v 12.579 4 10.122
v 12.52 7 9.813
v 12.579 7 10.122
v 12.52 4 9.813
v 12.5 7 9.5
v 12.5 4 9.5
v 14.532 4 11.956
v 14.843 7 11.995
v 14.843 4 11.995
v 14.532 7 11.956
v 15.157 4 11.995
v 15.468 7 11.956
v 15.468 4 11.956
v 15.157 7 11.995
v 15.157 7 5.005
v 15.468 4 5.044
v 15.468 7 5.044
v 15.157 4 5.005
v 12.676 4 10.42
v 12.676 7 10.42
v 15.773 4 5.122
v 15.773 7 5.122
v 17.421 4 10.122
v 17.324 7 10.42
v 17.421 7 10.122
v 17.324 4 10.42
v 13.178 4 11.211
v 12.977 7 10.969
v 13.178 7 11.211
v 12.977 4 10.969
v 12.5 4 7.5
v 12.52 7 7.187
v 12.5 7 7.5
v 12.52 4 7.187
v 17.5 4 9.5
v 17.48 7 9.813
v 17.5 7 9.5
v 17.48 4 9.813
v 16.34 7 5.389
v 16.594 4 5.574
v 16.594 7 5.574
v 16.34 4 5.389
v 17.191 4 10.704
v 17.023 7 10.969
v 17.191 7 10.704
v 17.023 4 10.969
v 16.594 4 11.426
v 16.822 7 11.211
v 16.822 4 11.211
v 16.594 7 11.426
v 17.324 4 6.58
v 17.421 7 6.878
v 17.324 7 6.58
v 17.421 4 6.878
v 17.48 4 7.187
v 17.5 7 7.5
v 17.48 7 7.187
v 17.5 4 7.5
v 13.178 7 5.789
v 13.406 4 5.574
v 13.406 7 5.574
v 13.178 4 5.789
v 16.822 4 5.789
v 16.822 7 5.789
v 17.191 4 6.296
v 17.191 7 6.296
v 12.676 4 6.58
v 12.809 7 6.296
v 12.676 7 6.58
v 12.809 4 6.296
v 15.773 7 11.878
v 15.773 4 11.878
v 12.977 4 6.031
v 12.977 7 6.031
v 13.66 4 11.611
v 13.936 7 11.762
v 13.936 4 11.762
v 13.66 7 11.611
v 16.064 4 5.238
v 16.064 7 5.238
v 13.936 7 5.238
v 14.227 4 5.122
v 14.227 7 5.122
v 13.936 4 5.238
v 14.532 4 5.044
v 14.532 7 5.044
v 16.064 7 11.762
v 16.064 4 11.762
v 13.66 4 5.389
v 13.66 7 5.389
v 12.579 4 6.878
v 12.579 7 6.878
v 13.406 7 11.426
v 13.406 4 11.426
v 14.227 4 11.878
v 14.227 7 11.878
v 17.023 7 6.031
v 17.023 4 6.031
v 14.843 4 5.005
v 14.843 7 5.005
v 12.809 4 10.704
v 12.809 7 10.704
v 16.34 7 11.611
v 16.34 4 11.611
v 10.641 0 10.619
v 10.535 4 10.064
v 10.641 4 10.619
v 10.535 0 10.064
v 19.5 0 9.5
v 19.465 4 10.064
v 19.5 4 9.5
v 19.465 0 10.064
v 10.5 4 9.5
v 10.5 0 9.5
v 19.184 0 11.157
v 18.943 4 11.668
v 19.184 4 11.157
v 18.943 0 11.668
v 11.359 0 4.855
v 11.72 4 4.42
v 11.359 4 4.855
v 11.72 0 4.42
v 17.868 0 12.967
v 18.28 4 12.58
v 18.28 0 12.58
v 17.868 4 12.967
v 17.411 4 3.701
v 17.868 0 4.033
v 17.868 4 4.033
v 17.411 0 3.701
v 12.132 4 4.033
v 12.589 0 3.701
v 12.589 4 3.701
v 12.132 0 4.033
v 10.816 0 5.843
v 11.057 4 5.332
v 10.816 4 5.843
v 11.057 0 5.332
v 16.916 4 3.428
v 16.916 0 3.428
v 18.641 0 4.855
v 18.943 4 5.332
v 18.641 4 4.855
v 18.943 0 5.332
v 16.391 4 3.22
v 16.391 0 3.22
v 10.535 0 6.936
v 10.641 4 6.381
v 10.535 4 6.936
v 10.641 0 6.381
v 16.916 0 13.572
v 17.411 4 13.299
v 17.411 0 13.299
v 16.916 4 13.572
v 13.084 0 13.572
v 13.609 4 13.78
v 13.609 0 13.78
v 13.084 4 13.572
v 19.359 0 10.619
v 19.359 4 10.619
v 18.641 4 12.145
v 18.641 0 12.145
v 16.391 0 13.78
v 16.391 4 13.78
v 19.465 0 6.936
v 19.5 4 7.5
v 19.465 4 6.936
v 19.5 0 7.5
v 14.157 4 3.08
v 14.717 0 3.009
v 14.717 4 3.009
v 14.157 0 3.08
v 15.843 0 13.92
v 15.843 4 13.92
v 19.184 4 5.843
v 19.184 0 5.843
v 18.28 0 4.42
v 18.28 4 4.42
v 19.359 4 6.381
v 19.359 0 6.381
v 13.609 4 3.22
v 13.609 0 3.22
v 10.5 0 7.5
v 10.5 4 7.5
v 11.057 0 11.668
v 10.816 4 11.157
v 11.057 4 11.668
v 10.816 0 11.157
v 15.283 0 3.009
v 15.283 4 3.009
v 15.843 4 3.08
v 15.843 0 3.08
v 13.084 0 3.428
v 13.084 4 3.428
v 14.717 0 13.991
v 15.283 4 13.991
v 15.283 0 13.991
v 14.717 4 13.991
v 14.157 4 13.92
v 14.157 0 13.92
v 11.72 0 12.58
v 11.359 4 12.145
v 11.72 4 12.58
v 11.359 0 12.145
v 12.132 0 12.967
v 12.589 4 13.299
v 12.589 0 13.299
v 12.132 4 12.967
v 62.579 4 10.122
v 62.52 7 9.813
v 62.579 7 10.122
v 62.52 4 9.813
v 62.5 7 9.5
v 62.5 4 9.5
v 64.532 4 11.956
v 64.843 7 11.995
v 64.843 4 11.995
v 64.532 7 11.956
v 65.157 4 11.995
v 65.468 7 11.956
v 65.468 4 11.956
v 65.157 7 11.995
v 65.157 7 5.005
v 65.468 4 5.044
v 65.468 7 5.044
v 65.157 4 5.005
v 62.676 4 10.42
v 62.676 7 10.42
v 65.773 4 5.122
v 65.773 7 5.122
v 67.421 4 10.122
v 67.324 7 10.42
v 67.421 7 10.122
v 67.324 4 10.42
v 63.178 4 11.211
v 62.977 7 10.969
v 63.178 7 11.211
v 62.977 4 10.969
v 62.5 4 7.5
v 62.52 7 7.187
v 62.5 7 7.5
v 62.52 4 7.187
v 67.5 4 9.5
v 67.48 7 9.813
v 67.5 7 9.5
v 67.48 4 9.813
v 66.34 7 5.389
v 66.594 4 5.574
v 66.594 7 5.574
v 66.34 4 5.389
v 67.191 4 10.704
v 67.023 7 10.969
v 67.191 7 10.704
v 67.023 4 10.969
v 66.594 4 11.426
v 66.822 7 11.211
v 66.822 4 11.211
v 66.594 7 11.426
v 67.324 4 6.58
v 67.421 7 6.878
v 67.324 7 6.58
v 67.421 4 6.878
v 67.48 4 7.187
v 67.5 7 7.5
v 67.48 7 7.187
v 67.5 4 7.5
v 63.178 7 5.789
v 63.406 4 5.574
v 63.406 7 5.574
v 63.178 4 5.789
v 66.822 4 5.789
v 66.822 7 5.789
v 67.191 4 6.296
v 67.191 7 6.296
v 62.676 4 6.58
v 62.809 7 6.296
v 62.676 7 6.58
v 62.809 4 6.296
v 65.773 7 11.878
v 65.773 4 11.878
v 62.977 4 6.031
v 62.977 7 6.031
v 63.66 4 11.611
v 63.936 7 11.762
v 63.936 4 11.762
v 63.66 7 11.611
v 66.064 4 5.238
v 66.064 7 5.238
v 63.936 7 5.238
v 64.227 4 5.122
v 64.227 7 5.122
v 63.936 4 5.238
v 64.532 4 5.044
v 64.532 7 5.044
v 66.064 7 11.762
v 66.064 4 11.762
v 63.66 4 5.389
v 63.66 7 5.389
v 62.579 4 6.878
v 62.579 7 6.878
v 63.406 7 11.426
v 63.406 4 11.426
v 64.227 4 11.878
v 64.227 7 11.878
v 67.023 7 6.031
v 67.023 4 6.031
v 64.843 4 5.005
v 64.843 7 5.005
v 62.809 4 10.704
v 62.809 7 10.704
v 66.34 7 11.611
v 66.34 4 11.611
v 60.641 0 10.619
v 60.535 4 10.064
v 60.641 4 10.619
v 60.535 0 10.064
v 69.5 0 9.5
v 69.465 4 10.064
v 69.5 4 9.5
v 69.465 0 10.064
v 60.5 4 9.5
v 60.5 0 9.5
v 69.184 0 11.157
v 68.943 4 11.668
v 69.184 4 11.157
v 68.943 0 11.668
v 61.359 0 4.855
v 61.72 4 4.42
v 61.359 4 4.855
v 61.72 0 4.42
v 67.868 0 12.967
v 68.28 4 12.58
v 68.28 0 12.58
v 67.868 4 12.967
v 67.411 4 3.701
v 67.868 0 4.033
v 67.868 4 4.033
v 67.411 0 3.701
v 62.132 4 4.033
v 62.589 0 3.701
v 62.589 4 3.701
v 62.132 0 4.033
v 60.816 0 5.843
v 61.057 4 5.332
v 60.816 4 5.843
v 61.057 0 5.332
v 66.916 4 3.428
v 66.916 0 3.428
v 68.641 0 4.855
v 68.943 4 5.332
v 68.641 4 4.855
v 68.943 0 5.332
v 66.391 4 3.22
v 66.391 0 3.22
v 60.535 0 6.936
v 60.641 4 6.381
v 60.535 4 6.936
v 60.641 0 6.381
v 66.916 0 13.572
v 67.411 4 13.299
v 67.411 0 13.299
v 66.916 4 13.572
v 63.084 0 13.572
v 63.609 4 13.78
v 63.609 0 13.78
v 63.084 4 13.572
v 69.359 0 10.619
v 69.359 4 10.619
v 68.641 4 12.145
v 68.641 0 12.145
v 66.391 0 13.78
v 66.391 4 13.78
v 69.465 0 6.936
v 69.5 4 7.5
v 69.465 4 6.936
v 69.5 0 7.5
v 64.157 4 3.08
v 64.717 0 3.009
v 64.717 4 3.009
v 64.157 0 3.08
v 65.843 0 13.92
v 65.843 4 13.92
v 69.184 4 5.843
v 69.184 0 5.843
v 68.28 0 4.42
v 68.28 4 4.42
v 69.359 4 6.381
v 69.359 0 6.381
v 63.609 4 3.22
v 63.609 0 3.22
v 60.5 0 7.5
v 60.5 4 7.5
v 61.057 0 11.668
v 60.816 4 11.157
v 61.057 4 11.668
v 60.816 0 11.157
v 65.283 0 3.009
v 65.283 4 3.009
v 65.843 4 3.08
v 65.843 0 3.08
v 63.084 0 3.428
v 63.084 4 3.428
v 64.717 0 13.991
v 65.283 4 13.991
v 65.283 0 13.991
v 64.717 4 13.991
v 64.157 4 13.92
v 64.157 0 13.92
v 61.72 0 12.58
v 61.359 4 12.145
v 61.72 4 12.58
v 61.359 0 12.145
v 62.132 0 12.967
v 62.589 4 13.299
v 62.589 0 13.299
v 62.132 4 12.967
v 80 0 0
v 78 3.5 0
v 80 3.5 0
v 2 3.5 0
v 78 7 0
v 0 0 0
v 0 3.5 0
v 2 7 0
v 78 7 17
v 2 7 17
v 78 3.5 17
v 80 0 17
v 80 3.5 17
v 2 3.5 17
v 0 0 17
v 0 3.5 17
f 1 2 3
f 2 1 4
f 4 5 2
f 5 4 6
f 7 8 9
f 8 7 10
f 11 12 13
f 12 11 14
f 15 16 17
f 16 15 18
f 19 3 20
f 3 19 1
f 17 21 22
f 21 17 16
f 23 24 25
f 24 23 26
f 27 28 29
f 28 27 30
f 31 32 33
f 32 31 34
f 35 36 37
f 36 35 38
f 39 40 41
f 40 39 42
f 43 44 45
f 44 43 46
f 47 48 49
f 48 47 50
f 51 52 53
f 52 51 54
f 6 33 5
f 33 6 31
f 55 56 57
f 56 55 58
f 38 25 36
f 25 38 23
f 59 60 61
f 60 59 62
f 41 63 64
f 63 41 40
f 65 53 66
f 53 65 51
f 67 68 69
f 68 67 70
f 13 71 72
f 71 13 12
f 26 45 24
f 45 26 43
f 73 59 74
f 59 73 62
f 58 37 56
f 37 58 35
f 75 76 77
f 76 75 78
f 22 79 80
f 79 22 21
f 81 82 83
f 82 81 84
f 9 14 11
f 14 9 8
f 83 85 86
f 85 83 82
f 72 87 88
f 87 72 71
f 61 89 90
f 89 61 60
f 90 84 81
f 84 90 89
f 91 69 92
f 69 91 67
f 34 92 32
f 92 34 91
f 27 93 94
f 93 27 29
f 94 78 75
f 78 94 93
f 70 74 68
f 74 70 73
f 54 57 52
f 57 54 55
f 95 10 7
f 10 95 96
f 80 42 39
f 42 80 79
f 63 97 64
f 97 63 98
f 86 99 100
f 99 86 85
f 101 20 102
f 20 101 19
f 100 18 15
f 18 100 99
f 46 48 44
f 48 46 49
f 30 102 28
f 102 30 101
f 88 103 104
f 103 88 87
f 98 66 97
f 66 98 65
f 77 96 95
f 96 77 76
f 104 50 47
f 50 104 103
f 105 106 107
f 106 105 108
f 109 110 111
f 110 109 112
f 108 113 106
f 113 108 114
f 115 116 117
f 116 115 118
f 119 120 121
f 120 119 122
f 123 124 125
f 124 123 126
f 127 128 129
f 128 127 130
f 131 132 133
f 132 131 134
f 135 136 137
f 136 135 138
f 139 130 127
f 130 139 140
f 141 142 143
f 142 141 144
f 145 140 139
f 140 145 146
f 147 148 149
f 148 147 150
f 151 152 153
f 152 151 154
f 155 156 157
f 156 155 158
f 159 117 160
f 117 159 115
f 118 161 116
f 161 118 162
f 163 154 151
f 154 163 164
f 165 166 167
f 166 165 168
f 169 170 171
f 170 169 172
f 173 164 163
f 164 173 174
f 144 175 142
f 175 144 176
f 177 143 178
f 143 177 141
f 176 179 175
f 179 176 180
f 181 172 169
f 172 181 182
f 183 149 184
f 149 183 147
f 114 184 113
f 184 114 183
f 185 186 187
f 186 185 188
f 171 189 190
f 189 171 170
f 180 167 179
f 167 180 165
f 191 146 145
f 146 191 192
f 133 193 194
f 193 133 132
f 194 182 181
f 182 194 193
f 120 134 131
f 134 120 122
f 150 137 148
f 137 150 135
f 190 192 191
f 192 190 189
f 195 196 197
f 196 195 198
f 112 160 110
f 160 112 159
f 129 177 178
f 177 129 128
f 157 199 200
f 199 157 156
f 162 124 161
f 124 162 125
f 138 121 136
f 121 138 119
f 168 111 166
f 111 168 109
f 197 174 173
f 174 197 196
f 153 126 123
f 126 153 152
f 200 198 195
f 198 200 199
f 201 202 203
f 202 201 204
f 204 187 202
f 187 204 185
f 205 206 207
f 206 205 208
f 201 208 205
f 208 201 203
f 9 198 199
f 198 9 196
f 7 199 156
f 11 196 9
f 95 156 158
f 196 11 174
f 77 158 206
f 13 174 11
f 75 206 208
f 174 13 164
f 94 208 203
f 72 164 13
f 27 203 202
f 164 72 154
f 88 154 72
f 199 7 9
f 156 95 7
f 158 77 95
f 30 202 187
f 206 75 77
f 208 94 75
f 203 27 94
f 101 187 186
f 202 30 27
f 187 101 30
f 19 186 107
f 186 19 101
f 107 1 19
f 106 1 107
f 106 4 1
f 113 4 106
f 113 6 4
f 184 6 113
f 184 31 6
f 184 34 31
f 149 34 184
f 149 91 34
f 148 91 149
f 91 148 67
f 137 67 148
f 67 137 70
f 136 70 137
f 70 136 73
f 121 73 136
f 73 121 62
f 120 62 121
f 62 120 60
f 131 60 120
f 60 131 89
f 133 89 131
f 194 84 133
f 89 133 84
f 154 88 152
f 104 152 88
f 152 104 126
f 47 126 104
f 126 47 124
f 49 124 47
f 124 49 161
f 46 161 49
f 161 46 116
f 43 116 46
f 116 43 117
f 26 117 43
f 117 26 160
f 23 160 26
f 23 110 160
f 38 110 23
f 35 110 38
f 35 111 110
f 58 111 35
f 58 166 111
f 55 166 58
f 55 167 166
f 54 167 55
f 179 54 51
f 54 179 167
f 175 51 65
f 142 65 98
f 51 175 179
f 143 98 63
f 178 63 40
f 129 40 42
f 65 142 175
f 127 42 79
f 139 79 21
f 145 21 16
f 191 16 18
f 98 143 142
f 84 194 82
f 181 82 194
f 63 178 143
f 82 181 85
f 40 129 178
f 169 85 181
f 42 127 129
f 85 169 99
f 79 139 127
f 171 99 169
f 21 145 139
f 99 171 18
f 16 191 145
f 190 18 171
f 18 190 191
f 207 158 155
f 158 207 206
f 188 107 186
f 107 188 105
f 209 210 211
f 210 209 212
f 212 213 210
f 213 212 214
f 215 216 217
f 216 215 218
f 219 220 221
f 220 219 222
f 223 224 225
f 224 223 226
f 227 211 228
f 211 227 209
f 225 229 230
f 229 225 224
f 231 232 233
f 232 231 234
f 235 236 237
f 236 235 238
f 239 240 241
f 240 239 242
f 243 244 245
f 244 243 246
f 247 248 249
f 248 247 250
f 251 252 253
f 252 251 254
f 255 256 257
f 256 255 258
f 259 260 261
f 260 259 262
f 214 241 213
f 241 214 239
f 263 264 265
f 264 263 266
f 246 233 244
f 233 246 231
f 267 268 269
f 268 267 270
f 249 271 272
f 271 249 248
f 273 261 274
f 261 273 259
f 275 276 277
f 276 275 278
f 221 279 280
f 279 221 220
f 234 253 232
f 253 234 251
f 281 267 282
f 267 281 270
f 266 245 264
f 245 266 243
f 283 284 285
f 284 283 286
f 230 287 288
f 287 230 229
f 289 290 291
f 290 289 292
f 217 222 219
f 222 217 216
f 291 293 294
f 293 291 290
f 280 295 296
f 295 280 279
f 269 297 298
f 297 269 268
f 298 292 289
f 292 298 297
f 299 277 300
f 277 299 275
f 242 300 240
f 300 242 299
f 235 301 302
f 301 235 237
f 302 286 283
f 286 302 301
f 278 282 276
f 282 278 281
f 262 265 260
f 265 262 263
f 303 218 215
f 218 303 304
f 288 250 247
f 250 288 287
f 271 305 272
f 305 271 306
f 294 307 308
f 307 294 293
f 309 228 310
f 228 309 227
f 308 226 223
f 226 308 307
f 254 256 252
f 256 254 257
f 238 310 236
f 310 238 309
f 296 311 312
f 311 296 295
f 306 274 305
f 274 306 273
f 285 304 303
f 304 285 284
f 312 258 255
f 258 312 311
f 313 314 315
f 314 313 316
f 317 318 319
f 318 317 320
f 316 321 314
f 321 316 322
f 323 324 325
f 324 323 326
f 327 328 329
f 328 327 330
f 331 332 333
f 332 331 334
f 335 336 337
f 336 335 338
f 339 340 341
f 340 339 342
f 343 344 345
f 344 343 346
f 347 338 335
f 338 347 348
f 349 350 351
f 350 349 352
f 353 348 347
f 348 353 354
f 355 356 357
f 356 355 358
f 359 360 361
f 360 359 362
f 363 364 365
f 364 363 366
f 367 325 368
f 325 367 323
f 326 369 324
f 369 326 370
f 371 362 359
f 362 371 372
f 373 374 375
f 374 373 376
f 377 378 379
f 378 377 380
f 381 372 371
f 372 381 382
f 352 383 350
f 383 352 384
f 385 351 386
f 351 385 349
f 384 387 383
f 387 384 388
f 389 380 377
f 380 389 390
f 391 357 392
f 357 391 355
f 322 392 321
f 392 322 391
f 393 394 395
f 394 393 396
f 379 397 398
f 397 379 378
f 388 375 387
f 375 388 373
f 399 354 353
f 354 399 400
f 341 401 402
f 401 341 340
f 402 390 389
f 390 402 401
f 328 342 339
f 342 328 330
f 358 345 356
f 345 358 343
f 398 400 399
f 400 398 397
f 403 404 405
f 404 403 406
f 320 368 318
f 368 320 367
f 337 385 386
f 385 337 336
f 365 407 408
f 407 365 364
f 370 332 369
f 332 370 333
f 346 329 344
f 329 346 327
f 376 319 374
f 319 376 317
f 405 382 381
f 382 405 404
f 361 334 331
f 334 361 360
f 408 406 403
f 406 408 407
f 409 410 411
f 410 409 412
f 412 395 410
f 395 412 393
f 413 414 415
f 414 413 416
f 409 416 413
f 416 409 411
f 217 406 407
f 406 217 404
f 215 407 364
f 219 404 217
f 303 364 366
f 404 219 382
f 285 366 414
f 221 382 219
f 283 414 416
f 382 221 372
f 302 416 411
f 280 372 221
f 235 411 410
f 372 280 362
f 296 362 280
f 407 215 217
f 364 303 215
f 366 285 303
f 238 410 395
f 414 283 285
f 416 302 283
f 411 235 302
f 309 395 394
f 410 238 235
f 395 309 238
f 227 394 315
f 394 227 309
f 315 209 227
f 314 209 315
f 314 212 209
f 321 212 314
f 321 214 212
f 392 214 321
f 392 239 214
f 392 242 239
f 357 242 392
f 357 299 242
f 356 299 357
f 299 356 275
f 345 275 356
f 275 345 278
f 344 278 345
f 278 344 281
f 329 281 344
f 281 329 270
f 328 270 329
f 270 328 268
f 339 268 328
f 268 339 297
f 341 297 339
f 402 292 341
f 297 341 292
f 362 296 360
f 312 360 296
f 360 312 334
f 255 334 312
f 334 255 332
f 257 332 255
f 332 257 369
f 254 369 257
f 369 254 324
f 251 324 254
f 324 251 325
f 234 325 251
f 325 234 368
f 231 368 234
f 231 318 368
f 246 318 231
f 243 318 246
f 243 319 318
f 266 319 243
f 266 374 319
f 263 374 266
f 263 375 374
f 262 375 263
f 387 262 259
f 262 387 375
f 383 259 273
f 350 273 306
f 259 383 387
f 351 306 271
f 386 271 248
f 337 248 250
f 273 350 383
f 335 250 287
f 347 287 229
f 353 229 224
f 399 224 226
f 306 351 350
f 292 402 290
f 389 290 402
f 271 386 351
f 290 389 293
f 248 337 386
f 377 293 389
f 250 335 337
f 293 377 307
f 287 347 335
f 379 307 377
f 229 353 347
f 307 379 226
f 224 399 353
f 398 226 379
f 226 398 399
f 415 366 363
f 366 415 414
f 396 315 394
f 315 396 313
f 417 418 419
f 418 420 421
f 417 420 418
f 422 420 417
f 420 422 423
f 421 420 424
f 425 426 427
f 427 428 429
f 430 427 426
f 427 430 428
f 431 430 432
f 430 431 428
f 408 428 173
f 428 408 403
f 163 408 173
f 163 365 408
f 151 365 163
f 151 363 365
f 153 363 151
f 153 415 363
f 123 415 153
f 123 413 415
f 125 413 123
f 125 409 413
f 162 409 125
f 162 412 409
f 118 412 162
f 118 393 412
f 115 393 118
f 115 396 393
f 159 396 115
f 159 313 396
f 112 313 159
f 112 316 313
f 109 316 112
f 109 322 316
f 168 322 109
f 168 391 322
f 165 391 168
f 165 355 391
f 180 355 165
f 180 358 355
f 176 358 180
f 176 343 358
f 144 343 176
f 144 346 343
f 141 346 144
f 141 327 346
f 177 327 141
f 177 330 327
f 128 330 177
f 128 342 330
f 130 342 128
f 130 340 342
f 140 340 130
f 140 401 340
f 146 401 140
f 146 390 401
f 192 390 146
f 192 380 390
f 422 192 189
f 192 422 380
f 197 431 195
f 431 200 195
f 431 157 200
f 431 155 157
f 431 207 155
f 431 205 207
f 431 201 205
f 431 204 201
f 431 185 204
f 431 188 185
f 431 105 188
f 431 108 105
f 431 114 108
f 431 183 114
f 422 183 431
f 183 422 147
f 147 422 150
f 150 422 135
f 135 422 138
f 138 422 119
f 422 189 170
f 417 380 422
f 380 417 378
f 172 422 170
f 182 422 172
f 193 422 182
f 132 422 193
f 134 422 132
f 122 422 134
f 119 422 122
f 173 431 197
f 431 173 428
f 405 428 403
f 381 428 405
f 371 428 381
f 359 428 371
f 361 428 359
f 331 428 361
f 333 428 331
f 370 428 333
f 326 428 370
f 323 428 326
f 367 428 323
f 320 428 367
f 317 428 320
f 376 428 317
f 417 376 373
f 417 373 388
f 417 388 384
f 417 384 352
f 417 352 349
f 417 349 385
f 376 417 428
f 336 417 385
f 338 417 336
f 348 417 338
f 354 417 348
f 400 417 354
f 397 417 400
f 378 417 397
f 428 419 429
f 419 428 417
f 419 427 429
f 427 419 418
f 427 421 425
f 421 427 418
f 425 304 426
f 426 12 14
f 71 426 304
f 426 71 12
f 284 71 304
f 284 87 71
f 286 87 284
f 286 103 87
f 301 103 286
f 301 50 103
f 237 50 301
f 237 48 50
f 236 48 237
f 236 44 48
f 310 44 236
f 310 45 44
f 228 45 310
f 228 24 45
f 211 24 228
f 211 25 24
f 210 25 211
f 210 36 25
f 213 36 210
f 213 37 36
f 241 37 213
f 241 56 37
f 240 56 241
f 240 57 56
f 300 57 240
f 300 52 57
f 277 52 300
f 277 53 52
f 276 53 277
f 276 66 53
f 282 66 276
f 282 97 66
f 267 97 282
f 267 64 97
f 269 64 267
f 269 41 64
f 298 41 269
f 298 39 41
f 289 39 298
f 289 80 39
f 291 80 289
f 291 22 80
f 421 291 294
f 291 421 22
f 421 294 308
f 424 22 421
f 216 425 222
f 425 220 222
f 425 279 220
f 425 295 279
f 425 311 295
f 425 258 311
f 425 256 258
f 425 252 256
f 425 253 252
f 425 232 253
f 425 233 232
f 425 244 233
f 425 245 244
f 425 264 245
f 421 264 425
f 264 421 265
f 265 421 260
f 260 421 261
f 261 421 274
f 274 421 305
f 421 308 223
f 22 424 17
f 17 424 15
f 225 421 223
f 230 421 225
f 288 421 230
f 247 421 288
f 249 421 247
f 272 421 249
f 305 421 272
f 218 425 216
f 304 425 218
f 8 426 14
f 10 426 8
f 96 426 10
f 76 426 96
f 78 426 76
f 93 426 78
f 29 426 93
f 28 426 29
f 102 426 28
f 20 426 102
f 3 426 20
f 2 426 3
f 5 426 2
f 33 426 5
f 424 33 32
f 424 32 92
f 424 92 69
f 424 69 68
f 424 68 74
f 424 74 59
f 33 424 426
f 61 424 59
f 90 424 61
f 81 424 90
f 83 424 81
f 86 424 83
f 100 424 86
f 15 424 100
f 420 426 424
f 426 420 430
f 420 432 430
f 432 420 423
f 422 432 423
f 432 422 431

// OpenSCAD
// file: ../lib/utils.scad
module cone(r, angle, invert=false) {
    h = tan((180 - angle) / 2) * r;
    translate([0, 0, -h]) {
        if (invert) {
                cylinder(r1=r,r2=0,h=h, $fn=20); 
        } else {
            cylinder(r1=0,r2=r,h=h, $fn=20); 
        }
    }
}

module roundrect(vect, r, $fn=20) {
    sq = len(vect) > 1
        ? [for (i = [0:1:len(vect)-1]) vect[i] - r * 2]
        : vect - r * 2;
    minkowski() {
        square(sq);
        translate([r, r])
            circle(r=r);
    }
}

module screw(r, d, l, head, head_d, cap, angle, $fn=20) {
    radius = r > 0 ? r : d / 2;
    head_r = head > 0 ? head : head_d / 2;

    union() {
        if (angle) {
            translate([0, 0, l])
                cone(head_r, angle, false);
        }
        linear_extrude(l)
            circle(r=radius);
        if (cap > 0) {
            translate([0, 0, l - cap])
                linear_extrude(cap)
                    circle(r=head_r);
        }
    }
}

module inset_screw(r, d, l, head, head_d, cap, angle, inset, $fn=20) {
    screw_height = l - inset;
    head_r = head > 0 ? head : head_d / 2;

    union() {
        screw(
            r=r,
            d=d,
            l=screw_height,
            head=head_r,
            cap=cap,
            angle=angle,
            $fn=$fn
        );
        translate([0, 0, screw_height])
            linear_extrude(inset)
                circle(r=head_r);
    }
}

function inch_to_mm(inches) = inches * 25.4;
function increase(vec, amt) = [for (i = vec) i + amt];
// main file
// Vinyl Record Display, Wall Mount
// by Nathan Wittstock <nate@fardog.io>

// preview[view: south east, tilt: top diagonal]

use <../lib/utils.scad>;

printing = "mount"; // ["tray", "mount"]

/* [Dimensions] */
width = 100;
tray_depth = 10;
tray_retainer_height = 10;
tray_thickness = 5;
tray_back_angle = 82;
tray_back_height = 20;
tray_back_thickness = 15;
tray_bottom_angle = 15;

/* [Mounting Plate] */
screw_d = 5;
screw_head_d = 9;
screw_slop = 4;
screw_plate_end_offset = 15;
screw_inset_extra = 1.5;
plate_thickness = 7;
plate_screw_allowance = 2;
plate_mount_inset = 10;
plate_tab_width = 2;
plate_insert_slop = 0.4;
plate_insert_amount = 5;

/* [Hidden] */
tray_back = [tray_back_thickness, tray_back_height];
tray_back_angle_bottom = tray_back_height / tan(tray_back_angle);
tray_angle = [
    [0, 0],
    [tray_back_angle_bottom, 0],
    [0, tray_back_height]
];
bottom_width = tray_back_thickness + tray_back_angle_bottom + tray_depth + tray_thickness;

tray_bottom_angle_bottom = (tray_depth + tray_back_angle_bottom) * tan(tray_bottom_angle);
tray_bottom_angle_poly = [
    [0, 0],
    [tray_depth, 0],
    [0, tray_bottom_angle_bottom]
];

plate_width = width - plate_mount_inset*2;
plate_height = screw_d + screw_slop*2 + plate_screw_allowance*2;

$fn = 50;

module plate_profile(inc=0) {
    t = [plate_tab_width, (plate_thickness/2)+inc, 0];
    union() {
        square([plate_width+inc, (plate_thickness/2)+inc]);
        translate(t)
            square([(plate_width-plate_tab_width*2)+inc, (plate_thickness/2)+inc]);
    }
}

module screw_profile(d, allowance) {
    translate([0, -allowance/2, 0])
        hull() {
            circle(d=d, center=true);
            translate([0, allowance, 0])
                circle(d=d, center=true);
        }
}

module profile() {
    union() {
        translate([0, tray_thickness, 0])
            square(tray_back);
        translate([tray_back_thickness, tray_thickness, 0])
            polygon(tray_angle);
        translate([tray_back_thickness, tray_thickness, 0])
            polygon(tray_bottom_angle_poly);
        square([bottom_width, tray_thickness]);
        translate([bottom_width-tray_thickness, tray_thickness, 0])
            square([tray_thickness, tray_retainer_height]);
    }
}

module screw_cutout() {
    rotate([-90, 0, 0]) {
        union() {
            linear_extrude(plate_thickness*2)
                screw_profile(screw_d, plate_screw_allowance);
            linear_extrude(plate_thickness/2 + screw_inset_extra)
                screw_profile(screw_head_d, plate_screw_allowance);
        }
    }
}

if (printing == "tray") {
    iam = plate_height + plate_insert_amount;
    difference() {
        linear_extrude(width) profile();
        translate([plate_thickness-plate_insert_slop, iam, plate_mount_inset-plate_insert_slop/2])
            rotate([-90, -90, 180]) linear_extrude(iam)
                plate_profile(inc=plate_insert_slop);
    }
} else if (printing == "mount") {
    difference() {
        linear_extrude(plate_height) plate_profile();
        translate([screw_plate_end_offset, -1, plate_height/2])
            screw_cutout();
        translate([plate_width - screw_plate_end_offset, -1, plate_height/2])
            screw_cutout();
    }
}
